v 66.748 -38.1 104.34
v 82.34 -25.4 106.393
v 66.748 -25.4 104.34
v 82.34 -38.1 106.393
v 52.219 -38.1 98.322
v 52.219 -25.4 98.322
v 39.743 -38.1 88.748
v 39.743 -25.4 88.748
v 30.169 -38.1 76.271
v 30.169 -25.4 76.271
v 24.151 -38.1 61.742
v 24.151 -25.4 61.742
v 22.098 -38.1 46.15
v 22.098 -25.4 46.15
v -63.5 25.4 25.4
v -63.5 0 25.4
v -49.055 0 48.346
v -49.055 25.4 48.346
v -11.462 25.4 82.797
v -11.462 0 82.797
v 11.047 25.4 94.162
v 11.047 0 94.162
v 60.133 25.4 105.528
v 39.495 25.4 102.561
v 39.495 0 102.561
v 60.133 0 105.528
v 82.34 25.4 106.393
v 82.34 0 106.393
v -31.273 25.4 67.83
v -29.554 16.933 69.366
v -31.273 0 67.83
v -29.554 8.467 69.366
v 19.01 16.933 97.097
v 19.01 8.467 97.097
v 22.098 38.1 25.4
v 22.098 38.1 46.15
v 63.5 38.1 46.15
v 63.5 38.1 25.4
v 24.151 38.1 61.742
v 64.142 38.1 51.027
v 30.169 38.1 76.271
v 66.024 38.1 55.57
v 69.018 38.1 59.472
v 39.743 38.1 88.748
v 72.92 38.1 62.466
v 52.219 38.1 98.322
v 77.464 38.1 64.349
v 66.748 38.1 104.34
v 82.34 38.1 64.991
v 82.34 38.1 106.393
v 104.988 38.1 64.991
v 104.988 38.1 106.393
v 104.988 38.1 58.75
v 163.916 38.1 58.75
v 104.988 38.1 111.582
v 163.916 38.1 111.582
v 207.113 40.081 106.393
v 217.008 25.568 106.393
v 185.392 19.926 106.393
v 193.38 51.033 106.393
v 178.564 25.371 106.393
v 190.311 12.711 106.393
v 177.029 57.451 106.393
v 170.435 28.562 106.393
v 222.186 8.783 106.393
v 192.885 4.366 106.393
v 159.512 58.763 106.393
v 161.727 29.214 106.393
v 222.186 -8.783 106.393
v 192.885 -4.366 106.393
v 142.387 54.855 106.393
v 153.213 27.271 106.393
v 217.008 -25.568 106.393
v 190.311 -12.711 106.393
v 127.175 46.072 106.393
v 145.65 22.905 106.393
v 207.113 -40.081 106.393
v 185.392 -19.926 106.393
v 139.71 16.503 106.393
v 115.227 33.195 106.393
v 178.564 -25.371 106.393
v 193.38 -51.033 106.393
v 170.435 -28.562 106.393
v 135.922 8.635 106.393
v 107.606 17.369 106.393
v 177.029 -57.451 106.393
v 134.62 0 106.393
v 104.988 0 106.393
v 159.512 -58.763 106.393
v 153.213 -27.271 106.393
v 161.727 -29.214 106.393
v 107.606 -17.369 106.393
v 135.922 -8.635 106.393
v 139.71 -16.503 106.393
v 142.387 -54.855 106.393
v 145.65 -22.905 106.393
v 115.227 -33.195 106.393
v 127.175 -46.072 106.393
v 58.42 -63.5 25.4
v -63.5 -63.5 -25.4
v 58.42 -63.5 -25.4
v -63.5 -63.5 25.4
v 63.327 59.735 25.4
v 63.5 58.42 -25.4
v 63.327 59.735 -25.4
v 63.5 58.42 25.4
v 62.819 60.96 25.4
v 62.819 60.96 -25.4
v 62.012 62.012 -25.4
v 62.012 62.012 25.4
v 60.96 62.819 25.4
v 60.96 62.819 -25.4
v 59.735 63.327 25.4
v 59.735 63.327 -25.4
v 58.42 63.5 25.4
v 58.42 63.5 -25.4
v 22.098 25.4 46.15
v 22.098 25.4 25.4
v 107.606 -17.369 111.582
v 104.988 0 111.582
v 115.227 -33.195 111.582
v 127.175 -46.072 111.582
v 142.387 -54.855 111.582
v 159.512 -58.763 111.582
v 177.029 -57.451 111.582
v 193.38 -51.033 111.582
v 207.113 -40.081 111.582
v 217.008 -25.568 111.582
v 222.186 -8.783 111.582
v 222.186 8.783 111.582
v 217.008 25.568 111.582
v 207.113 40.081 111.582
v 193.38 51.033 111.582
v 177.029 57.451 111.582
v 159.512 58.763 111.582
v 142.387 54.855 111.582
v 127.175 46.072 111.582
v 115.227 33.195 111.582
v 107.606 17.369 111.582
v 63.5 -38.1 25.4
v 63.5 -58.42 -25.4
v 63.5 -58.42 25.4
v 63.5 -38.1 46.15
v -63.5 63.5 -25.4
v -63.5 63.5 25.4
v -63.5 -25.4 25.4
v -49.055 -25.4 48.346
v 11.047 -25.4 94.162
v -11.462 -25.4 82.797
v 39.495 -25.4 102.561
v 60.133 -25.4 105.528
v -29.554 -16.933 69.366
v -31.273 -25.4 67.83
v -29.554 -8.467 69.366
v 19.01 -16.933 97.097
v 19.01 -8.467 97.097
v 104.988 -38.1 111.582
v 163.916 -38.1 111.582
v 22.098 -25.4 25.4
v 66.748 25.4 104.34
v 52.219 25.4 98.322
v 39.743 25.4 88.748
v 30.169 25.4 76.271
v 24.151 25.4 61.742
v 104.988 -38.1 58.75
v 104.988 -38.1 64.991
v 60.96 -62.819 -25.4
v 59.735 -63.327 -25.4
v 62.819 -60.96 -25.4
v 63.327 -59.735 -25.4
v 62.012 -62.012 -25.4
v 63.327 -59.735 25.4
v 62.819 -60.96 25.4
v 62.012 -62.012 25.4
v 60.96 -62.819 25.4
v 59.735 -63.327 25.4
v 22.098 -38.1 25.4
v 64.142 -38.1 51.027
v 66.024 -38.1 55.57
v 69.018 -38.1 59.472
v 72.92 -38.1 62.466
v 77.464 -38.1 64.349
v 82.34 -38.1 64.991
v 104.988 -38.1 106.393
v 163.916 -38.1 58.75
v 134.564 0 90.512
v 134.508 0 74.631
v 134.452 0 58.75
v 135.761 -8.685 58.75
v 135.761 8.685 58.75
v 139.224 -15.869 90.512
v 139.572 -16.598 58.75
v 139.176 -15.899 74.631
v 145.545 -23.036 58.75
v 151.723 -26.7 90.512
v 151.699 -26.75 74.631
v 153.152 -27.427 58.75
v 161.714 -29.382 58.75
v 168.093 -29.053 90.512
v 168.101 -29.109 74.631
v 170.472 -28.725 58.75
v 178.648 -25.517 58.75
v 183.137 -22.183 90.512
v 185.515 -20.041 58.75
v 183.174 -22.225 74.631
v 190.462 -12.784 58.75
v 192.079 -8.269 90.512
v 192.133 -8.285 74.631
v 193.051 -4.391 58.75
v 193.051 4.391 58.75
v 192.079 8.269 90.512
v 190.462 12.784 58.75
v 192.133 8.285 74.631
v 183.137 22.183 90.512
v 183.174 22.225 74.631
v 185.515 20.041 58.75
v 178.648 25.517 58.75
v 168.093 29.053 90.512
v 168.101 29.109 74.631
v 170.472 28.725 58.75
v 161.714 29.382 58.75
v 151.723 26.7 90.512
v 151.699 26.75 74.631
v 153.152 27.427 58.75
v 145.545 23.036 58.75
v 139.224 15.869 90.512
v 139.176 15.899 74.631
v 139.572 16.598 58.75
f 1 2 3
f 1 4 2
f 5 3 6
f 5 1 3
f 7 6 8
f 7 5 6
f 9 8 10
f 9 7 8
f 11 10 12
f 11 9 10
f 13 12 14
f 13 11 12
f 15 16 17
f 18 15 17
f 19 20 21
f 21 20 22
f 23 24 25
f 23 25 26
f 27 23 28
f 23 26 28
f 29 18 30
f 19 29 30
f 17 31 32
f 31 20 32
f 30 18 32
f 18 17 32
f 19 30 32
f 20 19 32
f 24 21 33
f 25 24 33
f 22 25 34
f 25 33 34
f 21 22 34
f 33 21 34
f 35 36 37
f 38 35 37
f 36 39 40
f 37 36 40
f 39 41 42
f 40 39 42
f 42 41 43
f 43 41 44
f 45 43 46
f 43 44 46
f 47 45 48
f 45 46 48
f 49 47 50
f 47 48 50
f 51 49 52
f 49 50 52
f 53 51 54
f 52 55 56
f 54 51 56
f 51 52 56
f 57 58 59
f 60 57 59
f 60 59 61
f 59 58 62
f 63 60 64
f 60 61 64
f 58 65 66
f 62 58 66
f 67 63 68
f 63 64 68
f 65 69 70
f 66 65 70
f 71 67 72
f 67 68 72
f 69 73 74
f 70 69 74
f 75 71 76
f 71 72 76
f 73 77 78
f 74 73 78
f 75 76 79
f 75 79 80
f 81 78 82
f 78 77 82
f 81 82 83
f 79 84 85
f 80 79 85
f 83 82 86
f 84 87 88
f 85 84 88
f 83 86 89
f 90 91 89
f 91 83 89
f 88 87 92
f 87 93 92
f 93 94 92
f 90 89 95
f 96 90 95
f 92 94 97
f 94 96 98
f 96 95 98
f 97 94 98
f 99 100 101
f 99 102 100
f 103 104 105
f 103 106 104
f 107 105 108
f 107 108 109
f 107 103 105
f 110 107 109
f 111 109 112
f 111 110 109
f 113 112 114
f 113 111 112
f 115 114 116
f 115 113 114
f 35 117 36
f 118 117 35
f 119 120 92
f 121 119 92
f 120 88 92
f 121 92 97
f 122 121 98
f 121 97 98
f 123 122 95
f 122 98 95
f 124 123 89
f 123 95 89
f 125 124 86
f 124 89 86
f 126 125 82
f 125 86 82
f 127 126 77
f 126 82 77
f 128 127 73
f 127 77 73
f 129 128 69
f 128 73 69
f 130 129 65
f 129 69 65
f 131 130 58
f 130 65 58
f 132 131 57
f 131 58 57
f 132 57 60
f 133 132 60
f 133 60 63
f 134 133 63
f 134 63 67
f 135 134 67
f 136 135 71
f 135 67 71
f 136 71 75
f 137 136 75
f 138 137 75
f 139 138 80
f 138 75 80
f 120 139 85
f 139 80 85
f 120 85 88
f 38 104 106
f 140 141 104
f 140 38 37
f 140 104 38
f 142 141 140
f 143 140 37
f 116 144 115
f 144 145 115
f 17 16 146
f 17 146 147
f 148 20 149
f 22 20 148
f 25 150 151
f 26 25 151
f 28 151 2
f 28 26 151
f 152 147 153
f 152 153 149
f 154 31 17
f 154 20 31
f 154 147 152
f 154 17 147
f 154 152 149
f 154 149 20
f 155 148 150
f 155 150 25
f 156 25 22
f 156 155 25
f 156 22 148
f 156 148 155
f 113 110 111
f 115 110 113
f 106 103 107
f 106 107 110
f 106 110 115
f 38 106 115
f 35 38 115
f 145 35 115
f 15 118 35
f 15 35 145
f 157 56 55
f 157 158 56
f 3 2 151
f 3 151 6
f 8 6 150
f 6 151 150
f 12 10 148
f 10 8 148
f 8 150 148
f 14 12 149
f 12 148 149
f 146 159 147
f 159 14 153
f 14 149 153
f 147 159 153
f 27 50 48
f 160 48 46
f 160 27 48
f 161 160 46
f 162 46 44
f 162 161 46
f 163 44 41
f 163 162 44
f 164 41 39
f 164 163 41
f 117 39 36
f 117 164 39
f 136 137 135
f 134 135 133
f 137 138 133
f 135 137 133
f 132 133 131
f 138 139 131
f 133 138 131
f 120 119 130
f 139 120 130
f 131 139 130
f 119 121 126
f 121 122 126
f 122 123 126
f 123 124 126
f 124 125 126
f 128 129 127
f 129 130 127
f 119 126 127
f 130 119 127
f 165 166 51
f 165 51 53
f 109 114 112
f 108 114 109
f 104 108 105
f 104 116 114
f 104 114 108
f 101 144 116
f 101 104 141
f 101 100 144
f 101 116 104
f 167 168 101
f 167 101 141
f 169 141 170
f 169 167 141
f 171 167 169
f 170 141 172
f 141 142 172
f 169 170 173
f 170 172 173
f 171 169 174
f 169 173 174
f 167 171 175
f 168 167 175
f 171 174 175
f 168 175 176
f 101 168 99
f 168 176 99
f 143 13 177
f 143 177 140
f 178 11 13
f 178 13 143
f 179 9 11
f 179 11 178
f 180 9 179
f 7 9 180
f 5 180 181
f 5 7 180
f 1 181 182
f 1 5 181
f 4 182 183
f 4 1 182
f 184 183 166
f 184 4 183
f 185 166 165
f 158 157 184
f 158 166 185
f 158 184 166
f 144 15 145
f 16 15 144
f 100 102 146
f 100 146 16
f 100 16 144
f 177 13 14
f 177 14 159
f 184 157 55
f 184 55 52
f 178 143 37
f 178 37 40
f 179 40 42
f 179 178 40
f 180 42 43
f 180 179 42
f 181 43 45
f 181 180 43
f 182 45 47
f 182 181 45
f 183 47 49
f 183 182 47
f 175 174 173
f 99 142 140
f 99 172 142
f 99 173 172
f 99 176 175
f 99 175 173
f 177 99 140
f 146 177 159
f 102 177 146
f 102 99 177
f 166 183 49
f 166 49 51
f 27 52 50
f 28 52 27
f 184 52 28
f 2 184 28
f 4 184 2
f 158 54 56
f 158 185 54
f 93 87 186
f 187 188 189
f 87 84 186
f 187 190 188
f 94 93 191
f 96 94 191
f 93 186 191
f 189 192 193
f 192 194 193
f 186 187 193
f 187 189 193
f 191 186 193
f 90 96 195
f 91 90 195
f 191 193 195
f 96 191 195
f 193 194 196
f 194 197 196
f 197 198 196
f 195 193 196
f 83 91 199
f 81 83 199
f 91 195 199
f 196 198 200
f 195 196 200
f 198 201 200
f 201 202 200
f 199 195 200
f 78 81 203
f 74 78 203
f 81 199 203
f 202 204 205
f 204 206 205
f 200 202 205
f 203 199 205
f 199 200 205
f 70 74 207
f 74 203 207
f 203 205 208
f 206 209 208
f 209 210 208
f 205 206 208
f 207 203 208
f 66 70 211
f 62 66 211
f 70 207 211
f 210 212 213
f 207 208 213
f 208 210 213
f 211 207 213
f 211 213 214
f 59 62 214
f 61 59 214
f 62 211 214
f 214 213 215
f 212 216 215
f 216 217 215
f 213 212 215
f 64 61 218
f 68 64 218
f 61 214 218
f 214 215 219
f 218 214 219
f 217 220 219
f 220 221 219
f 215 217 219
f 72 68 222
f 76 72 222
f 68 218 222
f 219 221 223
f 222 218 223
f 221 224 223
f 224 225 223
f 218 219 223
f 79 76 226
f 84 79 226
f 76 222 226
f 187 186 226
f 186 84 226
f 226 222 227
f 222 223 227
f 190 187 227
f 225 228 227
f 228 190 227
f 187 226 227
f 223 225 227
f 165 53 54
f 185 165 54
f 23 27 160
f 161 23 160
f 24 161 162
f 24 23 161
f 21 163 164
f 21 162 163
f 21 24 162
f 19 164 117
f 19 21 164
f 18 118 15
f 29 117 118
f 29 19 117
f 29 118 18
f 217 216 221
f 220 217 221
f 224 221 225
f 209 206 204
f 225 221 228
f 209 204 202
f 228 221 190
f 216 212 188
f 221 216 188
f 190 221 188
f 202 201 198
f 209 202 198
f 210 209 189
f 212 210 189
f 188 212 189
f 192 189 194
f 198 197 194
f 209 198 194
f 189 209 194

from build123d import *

# Parameters (mm, degrees)
F1_DEPTH = 63.5
F2_DEPTH = 38.1
F3_DEPTH = 38.1
F4_DEPTH = 25.4
F6_R     = 5.08


with BuildPart() as f1:
    # F0 (on Front) → F1 (new body, symmetric)
    with BuildSketch(Plane.XZ):
        Polygon((-63.5, -25.399997), (63.5, -25.399997), (63.5, 25.399997), (22.097999, 25.399997), (-63.5, 25.399997), align=None)
    extrude(amount=F1_DEPTH, both=True)

    # F0 (on Front) → F2 (join, symmetric)
    with BuildSketch(Plane.XZ):
        with BuildLine():
            Line((22.097999, 25.399997), (63.5, 25.399997))
            Line((63.5, 25.399997), (63.5, 46.150388))
            ThreePointArc((63.5, 46.150388), (69.018159, 59.472403), (82.340174, 64.990562))
            Line((82.340174, 64.990562), (104.987996, 64.990562))
            Line((104.987996, 64.990562), (104.987996, 106.392563))
            Line((104.987996, 106.392563), (82.340174, 106.392563))
            ThreePointArc((82.340174, 106.392563), (39.742524, 88.748038), (22.097999, 46.150388))
            Line((22.097999, 46.150388), (22.097999, 25.399997))
        make_face()
    extrude(amount=F2_DEPTH, both=True)

    # F0 (on Front) → F3 (join, symmetric)
    with BuildSketch(Plane.XZ):
        Polygon((104.987996, 111.5817), (104.987996, 106.392563), (134.619987, 106.392563), (134.452, 58.749718), (163.916005, 58.749718), (163.916005, 111.5817), align=None)
        Polygon((134.619987, 106.392563), (104.987996, 106.392563), (104.987996, 64.990562), (104.987996, 58.749718), (134.452, 58.749718), align=None)
    extrude(amount=F3_DEPTH, both=True)

    # F0 (on Front) → F4 (join, symmetric)
    with BuildSketch(Plane.XZ):
        with BuildLine():
            add(Edge.make_bspline(
                [(-63.5, 25.399997), (-36.813602, 76.749705), (11.578402, 107.047305), (82.340174, 106.392563)],
                knots=[0, 0, 0, 0, 166.820718, 166.820718, 166.820718, 166.820718], degree=3))
            Line((-63.5, 25.399997), (22.097999, 25.399997))
            Line((22.097999, 25.399997), (22.097999, 46.150388))
            ThreePointArc((22.097999, 46.150388), (39.742524, 88.748038), (82.340174, 106.392563))
        make_face()
    extrude(amount=F4_DEPTH, both=True)

    # F6
    f6_edges = [f1.edges().sort_by_distance(p)[0] for p in [
        (63.5, -63.5, 0),
        (63.5, 63.5, 0),
    ]]
    fillet(f6_edges, radius=F6_R)


with BuildPart() as f5:
    # F0 (on Front) → F5 (revolve)
    with BuildSketch(Plane.XZ):
        Polygon((104.987996, 111.5817), (104.987996, 106.392563), (134.619987, 106.392563), (134.452, 58.749718), (163.916005, 58.749718), (163.916005, 111.5817), align=None)
    revolve(axis=Axis((163.916005, 0, 85.165709), (0, 0, 1)))


solid = Compound([f1.part, f5.part])
